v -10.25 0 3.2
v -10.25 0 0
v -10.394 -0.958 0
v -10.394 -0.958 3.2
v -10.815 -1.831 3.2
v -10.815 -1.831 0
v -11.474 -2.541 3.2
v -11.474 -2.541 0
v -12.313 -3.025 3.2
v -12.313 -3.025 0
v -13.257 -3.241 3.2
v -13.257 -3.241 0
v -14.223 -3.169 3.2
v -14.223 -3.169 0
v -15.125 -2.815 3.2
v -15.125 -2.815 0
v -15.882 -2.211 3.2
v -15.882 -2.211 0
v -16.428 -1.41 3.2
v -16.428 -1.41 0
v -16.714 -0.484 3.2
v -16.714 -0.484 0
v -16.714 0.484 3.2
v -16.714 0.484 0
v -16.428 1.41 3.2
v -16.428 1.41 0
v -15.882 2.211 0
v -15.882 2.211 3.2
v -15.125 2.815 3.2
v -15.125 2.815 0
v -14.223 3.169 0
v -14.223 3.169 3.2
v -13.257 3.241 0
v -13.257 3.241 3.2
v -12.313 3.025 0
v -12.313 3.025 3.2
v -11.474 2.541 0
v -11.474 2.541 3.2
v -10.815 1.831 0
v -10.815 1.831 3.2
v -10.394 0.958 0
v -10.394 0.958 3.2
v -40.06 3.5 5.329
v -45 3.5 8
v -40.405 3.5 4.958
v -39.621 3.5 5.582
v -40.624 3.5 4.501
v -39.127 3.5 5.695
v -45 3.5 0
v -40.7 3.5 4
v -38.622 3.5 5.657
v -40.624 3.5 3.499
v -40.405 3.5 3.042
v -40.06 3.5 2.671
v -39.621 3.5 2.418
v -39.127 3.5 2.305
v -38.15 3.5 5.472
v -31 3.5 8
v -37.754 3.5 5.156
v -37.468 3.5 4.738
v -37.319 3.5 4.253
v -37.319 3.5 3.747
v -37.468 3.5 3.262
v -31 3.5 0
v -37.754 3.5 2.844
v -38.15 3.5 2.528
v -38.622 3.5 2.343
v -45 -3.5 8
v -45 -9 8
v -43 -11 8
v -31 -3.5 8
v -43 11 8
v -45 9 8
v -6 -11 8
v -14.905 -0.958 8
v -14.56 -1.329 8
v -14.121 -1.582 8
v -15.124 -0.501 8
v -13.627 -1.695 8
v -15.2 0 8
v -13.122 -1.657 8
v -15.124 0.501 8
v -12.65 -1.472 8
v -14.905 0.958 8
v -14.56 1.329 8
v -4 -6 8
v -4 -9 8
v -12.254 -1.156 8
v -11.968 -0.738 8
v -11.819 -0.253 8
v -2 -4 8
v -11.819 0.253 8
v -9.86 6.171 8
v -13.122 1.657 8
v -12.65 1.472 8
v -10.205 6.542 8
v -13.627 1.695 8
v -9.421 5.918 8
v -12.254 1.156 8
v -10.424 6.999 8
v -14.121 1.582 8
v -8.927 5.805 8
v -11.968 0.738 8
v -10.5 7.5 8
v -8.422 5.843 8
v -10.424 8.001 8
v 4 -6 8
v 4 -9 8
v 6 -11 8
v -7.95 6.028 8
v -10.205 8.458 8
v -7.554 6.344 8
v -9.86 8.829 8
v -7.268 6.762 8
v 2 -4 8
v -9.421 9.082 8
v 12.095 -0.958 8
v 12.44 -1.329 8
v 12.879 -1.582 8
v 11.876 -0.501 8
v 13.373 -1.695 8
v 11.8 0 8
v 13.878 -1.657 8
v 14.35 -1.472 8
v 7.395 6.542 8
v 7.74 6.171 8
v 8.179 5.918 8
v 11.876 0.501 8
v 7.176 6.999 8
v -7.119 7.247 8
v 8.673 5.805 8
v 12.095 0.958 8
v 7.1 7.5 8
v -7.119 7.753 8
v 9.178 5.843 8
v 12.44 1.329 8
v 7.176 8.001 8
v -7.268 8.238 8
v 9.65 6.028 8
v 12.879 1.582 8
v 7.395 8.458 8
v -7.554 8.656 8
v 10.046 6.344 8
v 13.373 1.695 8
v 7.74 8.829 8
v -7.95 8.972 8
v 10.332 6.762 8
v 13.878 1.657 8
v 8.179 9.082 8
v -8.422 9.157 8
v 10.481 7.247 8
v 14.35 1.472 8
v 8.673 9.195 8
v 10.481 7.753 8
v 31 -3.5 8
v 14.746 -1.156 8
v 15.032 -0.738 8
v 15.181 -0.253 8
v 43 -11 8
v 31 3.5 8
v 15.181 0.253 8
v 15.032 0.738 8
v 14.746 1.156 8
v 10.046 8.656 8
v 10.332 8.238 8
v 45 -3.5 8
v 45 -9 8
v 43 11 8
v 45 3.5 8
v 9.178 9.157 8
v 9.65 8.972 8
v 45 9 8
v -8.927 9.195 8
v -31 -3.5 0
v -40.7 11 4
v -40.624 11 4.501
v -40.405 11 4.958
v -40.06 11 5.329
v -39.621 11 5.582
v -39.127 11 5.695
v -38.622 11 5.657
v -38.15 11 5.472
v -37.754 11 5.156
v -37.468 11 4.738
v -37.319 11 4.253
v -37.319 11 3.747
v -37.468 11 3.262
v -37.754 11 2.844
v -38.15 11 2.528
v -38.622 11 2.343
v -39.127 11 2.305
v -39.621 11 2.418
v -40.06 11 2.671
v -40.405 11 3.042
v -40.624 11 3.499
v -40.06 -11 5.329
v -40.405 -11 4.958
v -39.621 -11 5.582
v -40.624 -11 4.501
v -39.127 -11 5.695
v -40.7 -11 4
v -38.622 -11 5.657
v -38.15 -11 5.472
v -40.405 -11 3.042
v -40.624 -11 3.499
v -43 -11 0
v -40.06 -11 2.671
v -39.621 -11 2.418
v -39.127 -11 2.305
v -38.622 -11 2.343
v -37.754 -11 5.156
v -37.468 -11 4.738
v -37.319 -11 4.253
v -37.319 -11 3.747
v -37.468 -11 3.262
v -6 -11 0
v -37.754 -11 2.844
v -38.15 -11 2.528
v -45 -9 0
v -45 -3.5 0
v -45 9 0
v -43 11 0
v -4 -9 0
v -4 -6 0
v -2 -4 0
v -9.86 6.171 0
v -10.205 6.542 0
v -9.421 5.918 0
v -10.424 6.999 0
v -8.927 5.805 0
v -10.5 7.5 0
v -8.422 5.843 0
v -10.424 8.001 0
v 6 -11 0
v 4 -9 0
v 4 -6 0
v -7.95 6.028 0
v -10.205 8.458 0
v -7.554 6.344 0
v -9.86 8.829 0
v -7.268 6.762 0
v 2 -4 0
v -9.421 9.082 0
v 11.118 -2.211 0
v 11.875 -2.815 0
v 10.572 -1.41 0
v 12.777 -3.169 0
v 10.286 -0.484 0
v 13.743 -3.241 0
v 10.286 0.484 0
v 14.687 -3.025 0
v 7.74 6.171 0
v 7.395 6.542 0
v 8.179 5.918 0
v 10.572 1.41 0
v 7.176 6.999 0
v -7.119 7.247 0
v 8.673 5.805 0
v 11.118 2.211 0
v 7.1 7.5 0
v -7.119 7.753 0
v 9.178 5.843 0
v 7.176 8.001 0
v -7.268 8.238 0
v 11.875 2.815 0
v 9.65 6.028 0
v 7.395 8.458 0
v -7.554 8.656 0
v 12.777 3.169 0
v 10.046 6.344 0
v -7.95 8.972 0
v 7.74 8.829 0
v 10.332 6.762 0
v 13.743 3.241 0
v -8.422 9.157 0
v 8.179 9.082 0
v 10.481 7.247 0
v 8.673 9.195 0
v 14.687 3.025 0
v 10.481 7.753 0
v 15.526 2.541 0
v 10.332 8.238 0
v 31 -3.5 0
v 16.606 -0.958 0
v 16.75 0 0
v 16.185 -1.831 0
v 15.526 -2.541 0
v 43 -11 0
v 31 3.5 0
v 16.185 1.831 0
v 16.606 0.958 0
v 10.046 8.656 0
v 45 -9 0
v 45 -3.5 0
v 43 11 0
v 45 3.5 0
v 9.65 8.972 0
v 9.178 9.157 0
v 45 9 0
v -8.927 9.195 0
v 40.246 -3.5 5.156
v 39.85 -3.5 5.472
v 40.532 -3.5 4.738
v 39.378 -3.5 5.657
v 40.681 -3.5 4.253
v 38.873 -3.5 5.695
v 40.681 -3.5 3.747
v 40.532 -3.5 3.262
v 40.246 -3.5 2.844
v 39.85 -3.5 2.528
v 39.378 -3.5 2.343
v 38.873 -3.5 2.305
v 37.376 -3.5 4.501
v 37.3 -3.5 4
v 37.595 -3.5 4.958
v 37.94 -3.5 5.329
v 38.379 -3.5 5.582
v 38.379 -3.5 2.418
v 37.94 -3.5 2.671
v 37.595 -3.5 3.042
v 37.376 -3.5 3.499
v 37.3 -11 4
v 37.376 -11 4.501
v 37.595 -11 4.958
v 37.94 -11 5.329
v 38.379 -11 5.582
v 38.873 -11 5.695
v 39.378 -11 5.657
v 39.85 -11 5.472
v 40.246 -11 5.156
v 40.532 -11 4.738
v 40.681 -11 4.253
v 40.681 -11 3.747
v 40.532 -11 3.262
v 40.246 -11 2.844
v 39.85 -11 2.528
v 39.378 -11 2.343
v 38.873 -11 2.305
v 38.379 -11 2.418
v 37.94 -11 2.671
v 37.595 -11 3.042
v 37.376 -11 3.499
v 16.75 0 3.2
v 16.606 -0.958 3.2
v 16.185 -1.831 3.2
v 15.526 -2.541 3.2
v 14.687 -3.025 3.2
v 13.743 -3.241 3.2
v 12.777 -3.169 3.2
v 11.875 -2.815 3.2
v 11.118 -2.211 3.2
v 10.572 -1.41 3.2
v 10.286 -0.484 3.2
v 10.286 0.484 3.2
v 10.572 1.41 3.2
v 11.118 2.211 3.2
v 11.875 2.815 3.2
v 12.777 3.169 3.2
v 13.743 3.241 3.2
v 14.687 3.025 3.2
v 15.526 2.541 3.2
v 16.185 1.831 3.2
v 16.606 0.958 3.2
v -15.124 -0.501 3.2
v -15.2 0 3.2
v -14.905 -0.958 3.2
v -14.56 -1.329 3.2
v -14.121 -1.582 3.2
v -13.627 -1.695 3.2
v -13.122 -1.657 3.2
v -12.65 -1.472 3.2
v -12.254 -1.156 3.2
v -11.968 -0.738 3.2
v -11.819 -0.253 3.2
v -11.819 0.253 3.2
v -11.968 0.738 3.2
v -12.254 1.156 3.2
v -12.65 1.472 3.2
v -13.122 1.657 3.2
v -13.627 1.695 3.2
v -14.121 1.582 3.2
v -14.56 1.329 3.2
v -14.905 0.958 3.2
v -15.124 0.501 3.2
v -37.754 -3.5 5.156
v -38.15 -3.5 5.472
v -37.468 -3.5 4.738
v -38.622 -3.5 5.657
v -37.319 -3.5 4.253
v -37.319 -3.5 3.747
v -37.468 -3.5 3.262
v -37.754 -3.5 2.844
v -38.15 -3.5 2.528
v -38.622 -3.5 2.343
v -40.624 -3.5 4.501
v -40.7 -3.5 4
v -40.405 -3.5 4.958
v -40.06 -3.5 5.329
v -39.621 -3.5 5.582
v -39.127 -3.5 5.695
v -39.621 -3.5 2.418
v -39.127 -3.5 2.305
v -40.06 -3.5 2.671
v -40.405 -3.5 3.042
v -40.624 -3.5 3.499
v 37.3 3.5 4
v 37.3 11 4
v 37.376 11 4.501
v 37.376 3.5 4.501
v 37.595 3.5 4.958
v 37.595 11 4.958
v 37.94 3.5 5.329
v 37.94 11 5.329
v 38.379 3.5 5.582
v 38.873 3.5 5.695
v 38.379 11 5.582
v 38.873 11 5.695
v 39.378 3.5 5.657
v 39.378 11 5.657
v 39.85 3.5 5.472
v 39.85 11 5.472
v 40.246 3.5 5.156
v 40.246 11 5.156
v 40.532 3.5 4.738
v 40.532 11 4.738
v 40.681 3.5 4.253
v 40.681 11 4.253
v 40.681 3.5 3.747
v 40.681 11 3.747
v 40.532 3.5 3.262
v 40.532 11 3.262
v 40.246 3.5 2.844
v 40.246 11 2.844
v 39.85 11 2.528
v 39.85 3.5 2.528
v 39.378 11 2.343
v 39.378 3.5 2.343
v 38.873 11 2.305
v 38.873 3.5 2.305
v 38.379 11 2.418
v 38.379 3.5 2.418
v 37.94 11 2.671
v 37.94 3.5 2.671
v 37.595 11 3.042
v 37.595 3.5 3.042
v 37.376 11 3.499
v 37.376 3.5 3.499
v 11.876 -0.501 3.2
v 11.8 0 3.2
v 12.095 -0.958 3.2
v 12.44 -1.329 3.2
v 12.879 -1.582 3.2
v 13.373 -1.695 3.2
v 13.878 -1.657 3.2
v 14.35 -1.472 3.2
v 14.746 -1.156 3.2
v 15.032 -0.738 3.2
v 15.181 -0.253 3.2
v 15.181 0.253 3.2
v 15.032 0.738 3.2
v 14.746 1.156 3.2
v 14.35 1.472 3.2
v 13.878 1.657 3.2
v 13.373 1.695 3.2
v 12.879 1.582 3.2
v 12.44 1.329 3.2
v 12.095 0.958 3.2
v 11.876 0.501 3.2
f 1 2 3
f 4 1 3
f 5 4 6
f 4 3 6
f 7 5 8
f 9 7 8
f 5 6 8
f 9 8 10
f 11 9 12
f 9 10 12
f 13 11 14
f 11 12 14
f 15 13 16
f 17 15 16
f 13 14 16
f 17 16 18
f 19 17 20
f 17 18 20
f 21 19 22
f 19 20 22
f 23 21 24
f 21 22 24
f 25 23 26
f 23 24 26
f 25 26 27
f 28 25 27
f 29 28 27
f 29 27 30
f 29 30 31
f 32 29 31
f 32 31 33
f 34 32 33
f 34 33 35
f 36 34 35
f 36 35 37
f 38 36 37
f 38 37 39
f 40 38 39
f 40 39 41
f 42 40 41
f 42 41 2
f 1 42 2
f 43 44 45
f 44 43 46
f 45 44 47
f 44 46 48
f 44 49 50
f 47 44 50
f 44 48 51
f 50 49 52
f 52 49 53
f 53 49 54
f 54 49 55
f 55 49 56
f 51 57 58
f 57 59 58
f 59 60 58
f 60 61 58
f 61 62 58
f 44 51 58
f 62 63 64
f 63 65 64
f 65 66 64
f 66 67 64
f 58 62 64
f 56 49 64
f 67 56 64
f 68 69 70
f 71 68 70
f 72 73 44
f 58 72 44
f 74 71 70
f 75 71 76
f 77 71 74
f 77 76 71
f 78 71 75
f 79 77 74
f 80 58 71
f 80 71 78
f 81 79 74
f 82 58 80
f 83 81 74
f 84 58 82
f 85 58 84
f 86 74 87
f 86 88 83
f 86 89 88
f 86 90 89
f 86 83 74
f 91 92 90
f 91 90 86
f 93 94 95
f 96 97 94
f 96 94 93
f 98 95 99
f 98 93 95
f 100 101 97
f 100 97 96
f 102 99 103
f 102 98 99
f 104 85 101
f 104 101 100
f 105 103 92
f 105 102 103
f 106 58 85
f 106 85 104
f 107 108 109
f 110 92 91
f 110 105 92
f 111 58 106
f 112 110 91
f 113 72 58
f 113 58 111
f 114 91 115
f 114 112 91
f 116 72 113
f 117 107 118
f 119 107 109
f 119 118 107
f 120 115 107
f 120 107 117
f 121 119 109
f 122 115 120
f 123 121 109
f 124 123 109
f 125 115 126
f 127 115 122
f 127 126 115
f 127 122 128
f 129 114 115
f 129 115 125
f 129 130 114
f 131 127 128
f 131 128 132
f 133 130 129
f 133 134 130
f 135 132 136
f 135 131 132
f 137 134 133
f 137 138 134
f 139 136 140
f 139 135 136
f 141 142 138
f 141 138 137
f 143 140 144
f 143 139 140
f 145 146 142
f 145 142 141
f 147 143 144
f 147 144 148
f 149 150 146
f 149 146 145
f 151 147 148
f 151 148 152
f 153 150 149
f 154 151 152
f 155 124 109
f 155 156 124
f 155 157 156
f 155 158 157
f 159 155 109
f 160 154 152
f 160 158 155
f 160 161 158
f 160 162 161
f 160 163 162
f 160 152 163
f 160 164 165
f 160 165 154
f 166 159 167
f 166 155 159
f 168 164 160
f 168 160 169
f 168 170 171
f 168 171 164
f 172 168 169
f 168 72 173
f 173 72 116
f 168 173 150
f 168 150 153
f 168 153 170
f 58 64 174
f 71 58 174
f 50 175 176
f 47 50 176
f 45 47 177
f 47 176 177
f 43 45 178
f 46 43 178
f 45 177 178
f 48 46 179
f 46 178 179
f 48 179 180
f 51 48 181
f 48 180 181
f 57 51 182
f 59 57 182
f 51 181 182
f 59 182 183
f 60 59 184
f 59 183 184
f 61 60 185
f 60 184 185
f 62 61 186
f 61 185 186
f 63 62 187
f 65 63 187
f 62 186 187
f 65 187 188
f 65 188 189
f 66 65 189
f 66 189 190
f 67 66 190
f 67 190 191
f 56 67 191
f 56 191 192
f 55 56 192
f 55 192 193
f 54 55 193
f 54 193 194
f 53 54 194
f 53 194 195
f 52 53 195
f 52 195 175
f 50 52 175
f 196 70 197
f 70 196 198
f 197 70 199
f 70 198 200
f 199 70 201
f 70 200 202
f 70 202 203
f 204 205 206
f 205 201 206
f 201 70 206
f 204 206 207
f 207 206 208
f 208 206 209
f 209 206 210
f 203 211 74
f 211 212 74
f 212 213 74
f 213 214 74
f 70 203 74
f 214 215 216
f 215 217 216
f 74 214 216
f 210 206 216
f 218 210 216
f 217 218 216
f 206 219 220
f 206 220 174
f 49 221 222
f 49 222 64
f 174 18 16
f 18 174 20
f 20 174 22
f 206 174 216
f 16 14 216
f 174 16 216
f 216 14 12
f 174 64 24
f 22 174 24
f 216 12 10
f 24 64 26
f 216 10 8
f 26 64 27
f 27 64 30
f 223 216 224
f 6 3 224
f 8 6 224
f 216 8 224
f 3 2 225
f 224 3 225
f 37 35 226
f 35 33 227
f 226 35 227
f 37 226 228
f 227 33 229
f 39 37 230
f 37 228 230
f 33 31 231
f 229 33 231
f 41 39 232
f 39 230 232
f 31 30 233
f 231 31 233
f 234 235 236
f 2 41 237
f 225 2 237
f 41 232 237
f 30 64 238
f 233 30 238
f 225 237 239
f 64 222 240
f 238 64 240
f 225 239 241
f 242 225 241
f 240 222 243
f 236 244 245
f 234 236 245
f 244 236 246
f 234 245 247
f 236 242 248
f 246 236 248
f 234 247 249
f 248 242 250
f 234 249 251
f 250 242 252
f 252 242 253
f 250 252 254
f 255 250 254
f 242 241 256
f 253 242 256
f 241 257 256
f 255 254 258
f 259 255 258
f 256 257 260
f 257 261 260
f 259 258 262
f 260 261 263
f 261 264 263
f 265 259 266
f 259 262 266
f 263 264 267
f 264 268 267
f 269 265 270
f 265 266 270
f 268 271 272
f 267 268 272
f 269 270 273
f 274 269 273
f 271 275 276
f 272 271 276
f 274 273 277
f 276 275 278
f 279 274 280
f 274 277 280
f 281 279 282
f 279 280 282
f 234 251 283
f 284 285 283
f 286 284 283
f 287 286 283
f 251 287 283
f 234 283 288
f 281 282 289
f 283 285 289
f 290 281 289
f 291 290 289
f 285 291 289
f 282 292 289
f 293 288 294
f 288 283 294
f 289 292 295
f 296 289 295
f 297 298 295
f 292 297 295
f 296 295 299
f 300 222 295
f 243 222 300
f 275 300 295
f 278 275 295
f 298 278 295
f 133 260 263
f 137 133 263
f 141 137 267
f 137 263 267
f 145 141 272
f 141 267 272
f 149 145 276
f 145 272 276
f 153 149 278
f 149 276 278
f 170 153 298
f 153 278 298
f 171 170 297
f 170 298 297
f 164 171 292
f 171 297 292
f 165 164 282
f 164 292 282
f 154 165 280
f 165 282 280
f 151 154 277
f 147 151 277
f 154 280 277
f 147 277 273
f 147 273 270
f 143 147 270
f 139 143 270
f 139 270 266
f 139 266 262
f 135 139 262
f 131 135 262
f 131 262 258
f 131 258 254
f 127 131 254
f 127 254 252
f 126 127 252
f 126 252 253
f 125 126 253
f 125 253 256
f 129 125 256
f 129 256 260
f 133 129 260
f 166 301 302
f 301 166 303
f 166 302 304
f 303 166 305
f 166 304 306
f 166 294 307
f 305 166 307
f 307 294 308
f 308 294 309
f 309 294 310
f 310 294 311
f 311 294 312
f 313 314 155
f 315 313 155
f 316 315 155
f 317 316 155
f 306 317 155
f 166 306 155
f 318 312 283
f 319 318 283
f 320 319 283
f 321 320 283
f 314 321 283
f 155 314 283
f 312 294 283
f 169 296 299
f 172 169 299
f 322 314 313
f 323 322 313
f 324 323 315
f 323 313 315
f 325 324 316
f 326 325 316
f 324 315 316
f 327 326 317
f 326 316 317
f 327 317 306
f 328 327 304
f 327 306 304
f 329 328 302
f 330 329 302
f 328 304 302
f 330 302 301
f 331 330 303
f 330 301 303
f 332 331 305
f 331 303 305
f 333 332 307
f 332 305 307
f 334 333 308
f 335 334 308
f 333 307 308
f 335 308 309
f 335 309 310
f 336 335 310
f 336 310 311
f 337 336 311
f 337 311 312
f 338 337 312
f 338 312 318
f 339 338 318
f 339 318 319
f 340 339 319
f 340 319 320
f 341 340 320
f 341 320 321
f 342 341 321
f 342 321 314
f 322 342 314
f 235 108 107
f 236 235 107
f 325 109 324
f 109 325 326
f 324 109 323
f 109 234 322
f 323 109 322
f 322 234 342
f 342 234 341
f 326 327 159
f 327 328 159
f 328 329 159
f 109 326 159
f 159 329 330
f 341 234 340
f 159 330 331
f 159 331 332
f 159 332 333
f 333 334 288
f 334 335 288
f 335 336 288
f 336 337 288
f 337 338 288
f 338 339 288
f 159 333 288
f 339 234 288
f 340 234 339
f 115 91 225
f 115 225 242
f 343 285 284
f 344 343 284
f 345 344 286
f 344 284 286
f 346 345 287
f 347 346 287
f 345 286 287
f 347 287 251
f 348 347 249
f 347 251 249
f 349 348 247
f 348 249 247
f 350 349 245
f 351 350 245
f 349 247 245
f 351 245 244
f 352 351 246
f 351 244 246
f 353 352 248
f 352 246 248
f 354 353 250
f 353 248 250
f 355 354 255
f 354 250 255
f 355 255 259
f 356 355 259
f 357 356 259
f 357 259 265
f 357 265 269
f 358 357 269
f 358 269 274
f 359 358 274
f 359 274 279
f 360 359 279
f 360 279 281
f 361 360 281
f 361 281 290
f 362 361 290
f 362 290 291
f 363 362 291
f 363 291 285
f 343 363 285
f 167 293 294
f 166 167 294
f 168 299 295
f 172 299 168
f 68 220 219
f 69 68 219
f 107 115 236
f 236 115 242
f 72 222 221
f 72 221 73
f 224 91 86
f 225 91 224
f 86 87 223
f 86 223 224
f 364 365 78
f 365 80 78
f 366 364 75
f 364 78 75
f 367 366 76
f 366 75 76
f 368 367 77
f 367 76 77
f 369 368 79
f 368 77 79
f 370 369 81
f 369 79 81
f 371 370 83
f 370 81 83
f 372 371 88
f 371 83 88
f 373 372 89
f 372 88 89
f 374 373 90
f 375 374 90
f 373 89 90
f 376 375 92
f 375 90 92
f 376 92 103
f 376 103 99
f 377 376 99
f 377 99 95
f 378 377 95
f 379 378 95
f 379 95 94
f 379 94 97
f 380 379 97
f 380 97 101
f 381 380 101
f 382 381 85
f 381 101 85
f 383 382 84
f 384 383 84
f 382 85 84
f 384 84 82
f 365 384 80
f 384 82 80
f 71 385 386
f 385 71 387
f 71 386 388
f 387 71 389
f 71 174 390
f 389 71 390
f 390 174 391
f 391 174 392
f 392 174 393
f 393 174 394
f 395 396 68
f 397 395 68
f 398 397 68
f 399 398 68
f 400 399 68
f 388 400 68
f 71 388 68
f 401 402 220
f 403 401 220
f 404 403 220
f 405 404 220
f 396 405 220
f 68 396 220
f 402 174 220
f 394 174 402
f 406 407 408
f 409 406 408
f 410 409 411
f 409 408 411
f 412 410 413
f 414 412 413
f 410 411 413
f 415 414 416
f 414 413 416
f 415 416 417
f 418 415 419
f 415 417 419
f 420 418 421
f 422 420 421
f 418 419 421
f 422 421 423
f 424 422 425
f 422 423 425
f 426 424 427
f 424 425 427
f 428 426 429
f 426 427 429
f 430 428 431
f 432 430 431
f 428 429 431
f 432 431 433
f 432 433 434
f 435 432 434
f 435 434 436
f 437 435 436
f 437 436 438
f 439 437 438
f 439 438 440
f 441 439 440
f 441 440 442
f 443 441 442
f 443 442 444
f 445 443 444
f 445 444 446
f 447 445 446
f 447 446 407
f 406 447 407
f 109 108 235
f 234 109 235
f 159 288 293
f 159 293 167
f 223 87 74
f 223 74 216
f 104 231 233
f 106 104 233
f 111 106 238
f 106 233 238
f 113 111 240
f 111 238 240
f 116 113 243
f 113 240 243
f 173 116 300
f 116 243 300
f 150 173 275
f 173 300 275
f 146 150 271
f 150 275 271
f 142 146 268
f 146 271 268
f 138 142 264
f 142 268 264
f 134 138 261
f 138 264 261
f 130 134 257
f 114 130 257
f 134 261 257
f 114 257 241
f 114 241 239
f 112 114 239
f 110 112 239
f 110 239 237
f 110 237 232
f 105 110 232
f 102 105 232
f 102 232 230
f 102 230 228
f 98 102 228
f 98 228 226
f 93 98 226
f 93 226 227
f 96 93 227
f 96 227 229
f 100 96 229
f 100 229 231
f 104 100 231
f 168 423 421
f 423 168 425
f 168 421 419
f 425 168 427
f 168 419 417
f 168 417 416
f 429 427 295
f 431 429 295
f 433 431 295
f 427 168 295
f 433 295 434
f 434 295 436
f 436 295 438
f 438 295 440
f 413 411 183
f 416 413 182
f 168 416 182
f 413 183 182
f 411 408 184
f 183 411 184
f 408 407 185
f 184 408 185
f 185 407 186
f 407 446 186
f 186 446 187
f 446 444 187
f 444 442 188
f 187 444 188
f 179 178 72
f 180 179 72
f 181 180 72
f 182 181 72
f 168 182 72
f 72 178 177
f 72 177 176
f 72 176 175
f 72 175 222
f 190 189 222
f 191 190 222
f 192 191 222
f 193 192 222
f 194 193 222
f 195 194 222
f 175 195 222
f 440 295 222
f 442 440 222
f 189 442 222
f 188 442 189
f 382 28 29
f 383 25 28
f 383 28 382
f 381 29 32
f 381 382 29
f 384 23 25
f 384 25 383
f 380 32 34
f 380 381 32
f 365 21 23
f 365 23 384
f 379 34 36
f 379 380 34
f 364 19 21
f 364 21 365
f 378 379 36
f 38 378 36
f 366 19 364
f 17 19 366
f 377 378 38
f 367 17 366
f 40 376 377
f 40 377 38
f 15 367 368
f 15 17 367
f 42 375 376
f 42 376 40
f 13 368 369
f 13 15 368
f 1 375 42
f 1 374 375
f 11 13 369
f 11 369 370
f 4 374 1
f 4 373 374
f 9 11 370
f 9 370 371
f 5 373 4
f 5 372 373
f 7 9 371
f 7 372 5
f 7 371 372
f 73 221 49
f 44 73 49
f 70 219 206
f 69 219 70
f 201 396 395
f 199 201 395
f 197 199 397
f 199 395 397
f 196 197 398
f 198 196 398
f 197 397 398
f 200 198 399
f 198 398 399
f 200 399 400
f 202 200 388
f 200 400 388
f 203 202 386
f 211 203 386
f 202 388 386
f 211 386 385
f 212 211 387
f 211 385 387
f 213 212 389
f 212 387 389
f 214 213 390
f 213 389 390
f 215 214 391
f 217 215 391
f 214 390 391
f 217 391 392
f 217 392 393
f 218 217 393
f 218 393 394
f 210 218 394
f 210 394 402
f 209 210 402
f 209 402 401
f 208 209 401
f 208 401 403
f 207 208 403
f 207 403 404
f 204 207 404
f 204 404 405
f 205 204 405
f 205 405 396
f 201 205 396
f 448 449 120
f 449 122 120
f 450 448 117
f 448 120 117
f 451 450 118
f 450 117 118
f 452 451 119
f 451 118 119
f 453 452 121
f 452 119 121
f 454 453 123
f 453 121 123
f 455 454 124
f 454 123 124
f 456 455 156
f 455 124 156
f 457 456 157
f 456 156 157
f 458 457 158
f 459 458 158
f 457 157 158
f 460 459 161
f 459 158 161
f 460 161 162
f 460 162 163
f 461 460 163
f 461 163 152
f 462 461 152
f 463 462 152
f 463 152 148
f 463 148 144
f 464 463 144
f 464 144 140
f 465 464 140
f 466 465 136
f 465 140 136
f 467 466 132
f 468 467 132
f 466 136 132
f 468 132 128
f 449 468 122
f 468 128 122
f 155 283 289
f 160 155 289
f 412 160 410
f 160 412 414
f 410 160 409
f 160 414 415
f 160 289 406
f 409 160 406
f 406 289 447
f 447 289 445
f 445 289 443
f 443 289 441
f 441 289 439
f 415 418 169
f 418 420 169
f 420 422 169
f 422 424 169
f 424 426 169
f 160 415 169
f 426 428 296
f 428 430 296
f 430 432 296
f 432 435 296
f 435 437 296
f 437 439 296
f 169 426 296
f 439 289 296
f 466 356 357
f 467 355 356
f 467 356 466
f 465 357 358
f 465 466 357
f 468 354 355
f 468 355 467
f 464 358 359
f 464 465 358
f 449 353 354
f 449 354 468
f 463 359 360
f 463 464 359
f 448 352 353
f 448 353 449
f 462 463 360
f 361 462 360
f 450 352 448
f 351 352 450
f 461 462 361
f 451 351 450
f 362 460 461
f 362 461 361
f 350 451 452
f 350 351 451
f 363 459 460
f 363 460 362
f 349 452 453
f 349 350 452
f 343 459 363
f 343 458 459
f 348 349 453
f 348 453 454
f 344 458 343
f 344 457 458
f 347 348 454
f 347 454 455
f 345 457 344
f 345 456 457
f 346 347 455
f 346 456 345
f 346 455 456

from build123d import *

# Parameters (mm, degrees)
F1_DEPTH       = 8
F3_D           = 3.4
F4_D           = 3.4
F4_CBORE_D     = 6.5
F4_CBORE_DEPTH = 3.2
F6_D           = 3.4
F5_W           = 8
F5_H           = 7
F7_DEPTH       = 8
F8_SIZE        = 2


with BuildPart() as f1:
    # F0 (on Top) → F1 (new body)
    with BuildSketch(Plane.XY):
        Polygon((-45, -11), (45, -11), (45, -3.5), (31, -3.5), (31, 3.5), (45, 3.5), (45, 11), (-45, 11), (-45, 3.5), (-31, 3.5), (-31, -3.5), (-45, -3.5), align=None)
    extrude(amount=F1_DEPTH)

    # F3 (through all)
    with Locations(Plane.XZ.offset(11)):
        with Locations((-39, 4), (39, 4)):
            Hole(F3_D / 2)

    # F4 (through all)
    with Locations(Plane(origin=(0, 0, 0), x_dir=(1, 0, 0), z_dir=(0, 0, -1))):
        with Locations((-13.5, 0), (13.5, 0)):
            CounterBoreHole(F4_D / 2, F4_CBORE_D / 2, F4_CBORE_DEPTH)

    # F6 (through all)
    with Locations(Plane.XY.offset(8)):
        with Locations((-8.8, 7.5), (8.8, 7.5)):
            Hole(F6_D / 2)

    # F5 (on face) → F7 (cut, through all)
    with BuildSketch(Plane.XY.offset(8)):
        with Locations((0, -7.5)):
            Rectangle(F5_W, F5_H)
    extrude(amount=-F7_DEPTH, mode=Mode.SUBTRACT)

    # F8
    f8_edges = [f1.edges().sort_by_distance(p)[0] for p in [
        (-45, -11, 4),
        (45, -11, 4),
        (4, -11, 4),
        (4, -4, 4),
        (-4, -4, 4),
        (-4, -11, 4),
        (45, 11, 4),
        (-45, 11, 4),
    ]]
    chamfer(f8_edges, length=F8_SIZE)


solid = f1.part
